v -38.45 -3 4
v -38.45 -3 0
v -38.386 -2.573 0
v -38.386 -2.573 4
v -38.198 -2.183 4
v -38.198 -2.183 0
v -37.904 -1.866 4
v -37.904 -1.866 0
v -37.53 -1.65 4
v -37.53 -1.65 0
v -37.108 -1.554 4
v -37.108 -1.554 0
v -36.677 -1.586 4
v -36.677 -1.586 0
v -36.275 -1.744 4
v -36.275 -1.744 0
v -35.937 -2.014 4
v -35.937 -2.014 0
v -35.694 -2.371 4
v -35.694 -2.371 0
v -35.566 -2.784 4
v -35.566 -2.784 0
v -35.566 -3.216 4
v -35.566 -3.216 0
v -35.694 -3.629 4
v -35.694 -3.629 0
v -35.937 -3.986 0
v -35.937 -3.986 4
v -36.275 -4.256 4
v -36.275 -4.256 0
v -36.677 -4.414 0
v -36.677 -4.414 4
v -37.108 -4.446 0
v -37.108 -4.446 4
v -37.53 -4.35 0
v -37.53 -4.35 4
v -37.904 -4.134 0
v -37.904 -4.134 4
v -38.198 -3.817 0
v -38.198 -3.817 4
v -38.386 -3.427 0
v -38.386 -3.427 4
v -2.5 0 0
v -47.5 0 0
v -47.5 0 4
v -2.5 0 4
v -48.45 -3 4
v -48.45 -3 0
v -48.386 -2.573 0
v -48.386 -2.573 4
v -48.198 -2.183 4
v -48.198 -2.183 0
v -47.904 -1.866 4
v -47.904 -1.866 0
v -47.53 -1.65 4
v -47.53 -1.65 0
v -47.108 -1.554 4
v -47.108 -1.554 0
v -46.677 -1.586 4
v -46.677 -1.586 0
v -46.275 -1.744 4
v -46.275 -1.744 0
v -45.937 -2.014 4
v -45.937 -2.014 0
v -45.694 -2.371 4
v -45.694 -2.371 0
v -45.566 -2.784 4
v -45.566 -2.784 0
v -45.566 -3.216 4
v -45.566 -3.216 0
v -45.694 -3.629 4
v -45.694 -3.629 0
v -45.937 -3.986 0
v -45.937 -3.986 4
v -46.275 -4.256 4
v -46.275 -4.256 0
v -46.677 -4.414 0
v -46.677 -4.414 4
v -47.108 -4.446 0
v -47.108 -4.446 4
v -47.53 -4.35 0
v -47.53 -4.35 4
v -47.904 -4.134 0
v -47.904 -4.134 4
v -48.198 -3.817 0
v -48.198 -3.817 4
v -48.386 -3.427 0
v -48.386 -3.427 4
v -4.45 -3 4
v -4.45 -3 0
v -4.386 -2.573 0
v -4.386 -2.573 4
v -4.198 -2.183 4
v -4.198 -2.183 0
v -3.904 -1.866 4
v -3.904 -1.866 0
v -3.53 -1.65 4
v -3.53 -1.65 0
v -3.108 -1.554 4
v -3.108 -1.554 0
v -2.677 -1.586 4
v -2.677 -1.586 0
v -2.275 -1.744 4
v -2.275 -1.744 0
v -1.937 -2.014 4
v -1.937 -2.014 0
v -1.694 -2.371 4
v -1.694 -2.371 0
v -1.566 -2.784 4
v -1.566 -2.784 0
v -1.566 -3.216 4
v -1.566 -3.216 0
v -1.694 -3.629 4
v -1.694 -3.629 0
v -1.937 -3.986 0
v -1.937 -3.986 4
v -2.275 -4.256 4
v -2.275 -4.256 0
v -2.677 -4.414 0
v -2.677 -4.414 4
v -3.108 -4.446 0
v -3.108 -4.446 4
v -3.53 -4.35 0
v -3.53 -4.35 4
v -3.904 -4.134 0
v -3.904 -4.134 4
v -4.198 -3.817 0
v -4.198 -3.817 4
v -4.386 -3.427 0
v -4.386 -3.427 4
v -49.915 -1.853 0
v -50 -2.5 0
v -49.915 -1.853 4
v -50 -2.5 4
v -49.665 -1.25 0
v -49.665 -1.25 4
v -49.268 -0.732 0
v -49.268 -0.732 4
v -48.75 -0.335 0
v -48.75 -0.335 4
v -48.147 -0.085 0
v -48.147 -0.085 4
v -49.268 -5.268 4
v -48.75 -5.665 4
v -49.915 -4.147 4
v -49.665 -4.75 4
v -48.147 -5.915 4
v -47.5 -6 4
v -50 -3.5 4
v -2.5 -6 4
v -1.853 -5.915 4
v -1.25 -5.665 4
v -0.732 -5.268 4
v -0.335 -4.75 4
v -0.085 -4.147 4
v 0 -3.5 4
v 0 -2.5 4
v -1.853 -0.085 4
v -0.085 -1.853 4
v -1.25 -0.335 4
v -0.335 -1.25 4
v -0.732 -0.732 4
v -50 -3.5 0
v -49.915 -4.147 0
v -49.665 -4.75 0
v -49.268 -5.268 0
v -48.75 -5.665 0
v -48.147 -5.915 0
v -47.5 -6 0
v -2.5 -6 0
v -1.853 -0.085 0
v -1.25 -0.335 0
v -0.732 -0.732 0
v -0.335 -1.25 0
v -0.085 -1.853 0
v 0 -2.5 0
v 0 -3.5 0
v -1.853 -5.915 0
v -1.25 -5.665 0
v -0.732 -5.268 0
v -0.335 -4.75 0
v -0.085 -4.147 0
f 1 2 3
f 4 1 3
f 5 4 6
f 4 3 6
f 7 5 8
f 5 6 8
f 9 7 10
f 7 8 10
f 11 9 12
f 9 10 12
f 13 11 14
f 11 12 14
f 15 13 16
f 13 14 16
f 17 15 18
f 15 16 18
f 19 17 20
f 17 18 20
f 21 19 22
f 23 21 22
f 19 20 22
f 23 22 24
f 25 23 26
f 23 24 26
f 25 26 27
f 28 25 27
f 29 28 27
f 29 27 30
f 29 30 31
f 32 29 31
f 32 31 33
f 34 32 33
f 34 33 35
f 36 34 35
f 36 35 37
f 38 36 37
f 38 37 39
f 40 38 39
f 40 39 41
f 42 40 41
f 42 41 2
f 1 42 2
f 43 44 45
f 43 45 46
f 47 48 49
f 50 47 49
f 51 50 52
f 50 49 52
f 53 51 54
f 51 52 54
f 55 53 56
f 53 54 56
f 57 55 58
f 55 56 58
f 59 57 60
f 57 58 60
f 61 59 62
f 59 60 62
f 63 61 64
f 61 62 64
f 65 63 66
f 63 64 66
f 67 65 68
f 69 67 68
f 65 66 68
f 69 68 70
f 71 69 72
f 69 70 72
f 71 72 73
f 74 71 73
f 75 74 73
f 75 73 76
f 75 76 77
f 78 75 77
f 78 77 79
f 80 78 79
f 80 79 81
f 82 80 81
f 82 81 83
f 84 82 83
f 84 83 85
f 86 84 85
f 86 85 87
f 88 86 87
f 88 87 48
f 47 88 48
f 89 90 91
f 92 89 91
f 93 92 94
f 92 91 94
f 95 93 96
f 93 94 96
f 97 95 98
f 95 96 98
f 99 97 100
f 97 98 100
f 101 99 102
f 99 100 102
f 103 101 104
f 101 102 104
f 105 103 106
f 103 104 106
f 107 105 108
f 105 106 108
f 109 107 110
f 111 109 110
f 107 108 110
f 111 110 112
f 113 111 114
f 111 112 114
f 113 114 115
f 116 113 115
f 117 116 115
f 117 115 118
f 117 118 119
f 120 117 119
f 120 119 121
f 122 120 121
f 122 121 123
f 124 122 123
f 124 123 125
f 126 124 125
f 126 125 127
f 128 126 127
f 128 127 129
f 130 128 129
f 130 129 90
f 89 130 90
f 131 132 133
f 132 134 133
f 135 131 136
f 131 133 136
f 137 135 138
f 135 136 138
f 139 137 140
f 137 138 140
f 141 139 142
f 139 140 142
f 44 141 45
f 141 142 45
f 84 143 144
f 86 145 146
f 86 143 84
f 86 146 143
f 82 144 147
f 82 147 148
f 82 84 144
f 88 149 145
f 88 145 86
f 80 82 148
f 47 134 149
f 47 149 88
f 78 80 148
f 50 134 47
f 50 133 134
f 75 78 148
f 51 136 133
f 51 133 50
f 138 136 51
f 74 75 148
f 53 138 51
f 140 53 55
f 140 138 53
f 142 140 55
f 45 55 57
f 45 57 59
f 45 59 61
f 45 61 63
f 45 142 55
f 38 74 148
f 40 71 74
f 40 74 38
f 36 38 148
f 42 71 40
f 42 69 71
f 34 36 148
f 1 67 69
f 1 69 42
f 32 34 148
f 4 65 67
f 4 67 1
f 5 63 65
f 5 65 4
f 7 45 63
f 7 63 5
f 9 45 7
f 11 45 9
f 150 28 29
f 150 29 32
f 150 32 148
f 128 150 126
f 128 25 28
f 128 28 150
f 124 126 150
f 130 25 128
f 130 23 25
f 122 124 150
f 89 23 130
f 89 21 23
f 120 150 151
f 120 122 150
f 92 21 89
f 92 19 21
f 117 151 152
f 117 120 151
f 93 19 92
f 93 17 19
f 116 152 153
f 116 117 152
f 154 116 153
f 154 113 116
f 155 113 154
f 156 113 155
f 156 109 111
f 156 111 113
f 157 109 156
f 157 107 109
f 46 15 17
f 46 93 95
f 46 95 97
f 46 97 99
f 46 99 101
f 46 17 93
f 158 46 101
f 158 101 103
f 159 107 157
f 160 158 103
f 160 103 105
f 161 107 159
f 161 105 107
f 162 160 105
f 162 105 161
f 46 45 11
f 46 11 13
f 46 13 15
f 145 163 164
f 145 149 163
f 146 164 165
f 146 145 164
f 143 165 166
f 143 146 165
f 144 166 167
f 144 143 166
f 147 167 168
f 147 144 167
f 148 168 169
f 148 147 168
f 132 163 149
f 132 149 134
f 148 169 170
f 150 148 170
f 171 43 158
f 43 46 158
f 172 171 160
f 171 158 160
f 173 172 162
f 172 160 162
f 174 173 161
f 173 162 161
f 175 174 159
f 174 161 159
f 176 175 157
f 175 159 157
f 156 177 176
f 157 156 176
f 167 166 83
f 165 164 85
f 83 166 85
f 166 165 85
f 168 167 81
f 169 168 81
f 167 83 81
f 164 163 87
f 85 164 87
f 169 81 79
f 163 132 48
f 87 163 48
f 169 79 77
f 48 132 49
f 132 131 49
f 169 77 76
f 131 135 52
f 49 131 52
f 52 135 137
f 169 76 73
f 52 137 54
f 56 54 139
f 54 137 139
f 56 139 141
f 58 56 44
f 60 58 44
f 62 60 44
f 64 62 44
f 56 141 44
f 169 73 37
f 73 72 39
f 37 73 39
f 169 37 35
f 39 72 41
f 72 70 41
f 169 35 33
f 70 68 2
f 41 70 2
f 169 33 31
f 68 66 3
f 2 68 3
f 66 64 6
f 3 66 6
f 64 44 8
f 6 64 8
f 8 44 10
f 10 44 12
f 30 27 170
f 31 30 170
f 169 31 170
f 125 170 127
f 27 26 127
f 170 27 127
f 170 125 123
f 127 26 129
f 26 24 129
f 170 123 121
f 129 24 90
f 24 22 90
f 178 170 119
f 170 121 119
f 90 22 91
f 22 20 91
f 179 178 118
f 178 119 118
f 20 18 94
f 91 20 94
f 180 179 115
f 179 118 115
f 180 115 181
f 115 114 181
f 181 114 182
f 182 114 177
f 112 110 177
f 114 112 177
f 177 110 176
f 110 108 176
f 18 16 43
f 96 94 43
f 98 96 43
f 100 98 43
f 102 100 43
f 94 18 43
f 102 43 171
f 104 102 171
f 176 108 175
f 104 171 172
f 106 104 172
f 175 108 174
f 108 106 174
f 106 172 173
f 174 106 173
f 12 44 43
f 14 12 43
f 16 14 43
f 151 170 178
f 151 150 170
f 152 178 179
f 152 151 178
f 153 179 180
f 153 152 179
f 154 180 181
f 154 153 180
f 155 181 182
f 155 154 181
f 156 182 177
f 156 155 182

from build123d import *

# Parameters (mm, degrees)
SKETCH1_W           = 50
SKETCH1_H           = 6
BOSS_EXTRUDE1_DEPTH = 4
SKETCH2_R           = 1.45
CUT_EXTRUDE1_DEPTH  = 51.517323761
FILLET1_R           = 2.5
SKETCH3_R           = 1.45
CUT_EXTRUDE2_DEPTH  = 51.517323761


with BuildPart() as part:
    # Sketch1 → Boss-Extrude1 (new body)
    with BuildSketch(Plane.XY):
        with Locations((-25, -3)):
            Rectangle(SKETCH1_W, SKETCH1_H)
    extrude(amount=BOSS_EXTRUDE1_DEPTH)

    # Sketch2 → Cut-Extrude1 (cut, through all)
    with BuildSketch(Plane(origin=(0, 0, 0), x_dir=(-1, 0, 0), z_dir=(0, 0, -1))):
        with Locations((3, -3)):
            Circle(SKETCH2_R)
        with Locations((37, -3)):
            Circle(SKETCH2_R)
    extrude(amount=-CUT_EXTRUDE1_DEPTH, mode=Mode.SUBTRACT)

    # Fillet1
    fillet1_edges = [part.edges().sort_by_distance(p)[0] for p in [
        (0, -6, 2),
        (-50, -6, 2),
        (-50, 0, 2),
        (0, 0, 2),
    ]]
    fillet(fillet1_edges, radius=FILLET1_R)

    # Sketch3 → Cut-Extrude2 (cut, through all)
    with BuildSketch(Plane(origin=(0, 0, 0), x_dir=(-1, 0, 0), z_dir=(0, 0, -1))):
        with Locations((47, -3)):
            Circle(SKETCH3_R)
    extrude(amount=-CUT_EXTRUDE2_DEPTH, mode=Mode.SUBTRACT)


solid = part.part
